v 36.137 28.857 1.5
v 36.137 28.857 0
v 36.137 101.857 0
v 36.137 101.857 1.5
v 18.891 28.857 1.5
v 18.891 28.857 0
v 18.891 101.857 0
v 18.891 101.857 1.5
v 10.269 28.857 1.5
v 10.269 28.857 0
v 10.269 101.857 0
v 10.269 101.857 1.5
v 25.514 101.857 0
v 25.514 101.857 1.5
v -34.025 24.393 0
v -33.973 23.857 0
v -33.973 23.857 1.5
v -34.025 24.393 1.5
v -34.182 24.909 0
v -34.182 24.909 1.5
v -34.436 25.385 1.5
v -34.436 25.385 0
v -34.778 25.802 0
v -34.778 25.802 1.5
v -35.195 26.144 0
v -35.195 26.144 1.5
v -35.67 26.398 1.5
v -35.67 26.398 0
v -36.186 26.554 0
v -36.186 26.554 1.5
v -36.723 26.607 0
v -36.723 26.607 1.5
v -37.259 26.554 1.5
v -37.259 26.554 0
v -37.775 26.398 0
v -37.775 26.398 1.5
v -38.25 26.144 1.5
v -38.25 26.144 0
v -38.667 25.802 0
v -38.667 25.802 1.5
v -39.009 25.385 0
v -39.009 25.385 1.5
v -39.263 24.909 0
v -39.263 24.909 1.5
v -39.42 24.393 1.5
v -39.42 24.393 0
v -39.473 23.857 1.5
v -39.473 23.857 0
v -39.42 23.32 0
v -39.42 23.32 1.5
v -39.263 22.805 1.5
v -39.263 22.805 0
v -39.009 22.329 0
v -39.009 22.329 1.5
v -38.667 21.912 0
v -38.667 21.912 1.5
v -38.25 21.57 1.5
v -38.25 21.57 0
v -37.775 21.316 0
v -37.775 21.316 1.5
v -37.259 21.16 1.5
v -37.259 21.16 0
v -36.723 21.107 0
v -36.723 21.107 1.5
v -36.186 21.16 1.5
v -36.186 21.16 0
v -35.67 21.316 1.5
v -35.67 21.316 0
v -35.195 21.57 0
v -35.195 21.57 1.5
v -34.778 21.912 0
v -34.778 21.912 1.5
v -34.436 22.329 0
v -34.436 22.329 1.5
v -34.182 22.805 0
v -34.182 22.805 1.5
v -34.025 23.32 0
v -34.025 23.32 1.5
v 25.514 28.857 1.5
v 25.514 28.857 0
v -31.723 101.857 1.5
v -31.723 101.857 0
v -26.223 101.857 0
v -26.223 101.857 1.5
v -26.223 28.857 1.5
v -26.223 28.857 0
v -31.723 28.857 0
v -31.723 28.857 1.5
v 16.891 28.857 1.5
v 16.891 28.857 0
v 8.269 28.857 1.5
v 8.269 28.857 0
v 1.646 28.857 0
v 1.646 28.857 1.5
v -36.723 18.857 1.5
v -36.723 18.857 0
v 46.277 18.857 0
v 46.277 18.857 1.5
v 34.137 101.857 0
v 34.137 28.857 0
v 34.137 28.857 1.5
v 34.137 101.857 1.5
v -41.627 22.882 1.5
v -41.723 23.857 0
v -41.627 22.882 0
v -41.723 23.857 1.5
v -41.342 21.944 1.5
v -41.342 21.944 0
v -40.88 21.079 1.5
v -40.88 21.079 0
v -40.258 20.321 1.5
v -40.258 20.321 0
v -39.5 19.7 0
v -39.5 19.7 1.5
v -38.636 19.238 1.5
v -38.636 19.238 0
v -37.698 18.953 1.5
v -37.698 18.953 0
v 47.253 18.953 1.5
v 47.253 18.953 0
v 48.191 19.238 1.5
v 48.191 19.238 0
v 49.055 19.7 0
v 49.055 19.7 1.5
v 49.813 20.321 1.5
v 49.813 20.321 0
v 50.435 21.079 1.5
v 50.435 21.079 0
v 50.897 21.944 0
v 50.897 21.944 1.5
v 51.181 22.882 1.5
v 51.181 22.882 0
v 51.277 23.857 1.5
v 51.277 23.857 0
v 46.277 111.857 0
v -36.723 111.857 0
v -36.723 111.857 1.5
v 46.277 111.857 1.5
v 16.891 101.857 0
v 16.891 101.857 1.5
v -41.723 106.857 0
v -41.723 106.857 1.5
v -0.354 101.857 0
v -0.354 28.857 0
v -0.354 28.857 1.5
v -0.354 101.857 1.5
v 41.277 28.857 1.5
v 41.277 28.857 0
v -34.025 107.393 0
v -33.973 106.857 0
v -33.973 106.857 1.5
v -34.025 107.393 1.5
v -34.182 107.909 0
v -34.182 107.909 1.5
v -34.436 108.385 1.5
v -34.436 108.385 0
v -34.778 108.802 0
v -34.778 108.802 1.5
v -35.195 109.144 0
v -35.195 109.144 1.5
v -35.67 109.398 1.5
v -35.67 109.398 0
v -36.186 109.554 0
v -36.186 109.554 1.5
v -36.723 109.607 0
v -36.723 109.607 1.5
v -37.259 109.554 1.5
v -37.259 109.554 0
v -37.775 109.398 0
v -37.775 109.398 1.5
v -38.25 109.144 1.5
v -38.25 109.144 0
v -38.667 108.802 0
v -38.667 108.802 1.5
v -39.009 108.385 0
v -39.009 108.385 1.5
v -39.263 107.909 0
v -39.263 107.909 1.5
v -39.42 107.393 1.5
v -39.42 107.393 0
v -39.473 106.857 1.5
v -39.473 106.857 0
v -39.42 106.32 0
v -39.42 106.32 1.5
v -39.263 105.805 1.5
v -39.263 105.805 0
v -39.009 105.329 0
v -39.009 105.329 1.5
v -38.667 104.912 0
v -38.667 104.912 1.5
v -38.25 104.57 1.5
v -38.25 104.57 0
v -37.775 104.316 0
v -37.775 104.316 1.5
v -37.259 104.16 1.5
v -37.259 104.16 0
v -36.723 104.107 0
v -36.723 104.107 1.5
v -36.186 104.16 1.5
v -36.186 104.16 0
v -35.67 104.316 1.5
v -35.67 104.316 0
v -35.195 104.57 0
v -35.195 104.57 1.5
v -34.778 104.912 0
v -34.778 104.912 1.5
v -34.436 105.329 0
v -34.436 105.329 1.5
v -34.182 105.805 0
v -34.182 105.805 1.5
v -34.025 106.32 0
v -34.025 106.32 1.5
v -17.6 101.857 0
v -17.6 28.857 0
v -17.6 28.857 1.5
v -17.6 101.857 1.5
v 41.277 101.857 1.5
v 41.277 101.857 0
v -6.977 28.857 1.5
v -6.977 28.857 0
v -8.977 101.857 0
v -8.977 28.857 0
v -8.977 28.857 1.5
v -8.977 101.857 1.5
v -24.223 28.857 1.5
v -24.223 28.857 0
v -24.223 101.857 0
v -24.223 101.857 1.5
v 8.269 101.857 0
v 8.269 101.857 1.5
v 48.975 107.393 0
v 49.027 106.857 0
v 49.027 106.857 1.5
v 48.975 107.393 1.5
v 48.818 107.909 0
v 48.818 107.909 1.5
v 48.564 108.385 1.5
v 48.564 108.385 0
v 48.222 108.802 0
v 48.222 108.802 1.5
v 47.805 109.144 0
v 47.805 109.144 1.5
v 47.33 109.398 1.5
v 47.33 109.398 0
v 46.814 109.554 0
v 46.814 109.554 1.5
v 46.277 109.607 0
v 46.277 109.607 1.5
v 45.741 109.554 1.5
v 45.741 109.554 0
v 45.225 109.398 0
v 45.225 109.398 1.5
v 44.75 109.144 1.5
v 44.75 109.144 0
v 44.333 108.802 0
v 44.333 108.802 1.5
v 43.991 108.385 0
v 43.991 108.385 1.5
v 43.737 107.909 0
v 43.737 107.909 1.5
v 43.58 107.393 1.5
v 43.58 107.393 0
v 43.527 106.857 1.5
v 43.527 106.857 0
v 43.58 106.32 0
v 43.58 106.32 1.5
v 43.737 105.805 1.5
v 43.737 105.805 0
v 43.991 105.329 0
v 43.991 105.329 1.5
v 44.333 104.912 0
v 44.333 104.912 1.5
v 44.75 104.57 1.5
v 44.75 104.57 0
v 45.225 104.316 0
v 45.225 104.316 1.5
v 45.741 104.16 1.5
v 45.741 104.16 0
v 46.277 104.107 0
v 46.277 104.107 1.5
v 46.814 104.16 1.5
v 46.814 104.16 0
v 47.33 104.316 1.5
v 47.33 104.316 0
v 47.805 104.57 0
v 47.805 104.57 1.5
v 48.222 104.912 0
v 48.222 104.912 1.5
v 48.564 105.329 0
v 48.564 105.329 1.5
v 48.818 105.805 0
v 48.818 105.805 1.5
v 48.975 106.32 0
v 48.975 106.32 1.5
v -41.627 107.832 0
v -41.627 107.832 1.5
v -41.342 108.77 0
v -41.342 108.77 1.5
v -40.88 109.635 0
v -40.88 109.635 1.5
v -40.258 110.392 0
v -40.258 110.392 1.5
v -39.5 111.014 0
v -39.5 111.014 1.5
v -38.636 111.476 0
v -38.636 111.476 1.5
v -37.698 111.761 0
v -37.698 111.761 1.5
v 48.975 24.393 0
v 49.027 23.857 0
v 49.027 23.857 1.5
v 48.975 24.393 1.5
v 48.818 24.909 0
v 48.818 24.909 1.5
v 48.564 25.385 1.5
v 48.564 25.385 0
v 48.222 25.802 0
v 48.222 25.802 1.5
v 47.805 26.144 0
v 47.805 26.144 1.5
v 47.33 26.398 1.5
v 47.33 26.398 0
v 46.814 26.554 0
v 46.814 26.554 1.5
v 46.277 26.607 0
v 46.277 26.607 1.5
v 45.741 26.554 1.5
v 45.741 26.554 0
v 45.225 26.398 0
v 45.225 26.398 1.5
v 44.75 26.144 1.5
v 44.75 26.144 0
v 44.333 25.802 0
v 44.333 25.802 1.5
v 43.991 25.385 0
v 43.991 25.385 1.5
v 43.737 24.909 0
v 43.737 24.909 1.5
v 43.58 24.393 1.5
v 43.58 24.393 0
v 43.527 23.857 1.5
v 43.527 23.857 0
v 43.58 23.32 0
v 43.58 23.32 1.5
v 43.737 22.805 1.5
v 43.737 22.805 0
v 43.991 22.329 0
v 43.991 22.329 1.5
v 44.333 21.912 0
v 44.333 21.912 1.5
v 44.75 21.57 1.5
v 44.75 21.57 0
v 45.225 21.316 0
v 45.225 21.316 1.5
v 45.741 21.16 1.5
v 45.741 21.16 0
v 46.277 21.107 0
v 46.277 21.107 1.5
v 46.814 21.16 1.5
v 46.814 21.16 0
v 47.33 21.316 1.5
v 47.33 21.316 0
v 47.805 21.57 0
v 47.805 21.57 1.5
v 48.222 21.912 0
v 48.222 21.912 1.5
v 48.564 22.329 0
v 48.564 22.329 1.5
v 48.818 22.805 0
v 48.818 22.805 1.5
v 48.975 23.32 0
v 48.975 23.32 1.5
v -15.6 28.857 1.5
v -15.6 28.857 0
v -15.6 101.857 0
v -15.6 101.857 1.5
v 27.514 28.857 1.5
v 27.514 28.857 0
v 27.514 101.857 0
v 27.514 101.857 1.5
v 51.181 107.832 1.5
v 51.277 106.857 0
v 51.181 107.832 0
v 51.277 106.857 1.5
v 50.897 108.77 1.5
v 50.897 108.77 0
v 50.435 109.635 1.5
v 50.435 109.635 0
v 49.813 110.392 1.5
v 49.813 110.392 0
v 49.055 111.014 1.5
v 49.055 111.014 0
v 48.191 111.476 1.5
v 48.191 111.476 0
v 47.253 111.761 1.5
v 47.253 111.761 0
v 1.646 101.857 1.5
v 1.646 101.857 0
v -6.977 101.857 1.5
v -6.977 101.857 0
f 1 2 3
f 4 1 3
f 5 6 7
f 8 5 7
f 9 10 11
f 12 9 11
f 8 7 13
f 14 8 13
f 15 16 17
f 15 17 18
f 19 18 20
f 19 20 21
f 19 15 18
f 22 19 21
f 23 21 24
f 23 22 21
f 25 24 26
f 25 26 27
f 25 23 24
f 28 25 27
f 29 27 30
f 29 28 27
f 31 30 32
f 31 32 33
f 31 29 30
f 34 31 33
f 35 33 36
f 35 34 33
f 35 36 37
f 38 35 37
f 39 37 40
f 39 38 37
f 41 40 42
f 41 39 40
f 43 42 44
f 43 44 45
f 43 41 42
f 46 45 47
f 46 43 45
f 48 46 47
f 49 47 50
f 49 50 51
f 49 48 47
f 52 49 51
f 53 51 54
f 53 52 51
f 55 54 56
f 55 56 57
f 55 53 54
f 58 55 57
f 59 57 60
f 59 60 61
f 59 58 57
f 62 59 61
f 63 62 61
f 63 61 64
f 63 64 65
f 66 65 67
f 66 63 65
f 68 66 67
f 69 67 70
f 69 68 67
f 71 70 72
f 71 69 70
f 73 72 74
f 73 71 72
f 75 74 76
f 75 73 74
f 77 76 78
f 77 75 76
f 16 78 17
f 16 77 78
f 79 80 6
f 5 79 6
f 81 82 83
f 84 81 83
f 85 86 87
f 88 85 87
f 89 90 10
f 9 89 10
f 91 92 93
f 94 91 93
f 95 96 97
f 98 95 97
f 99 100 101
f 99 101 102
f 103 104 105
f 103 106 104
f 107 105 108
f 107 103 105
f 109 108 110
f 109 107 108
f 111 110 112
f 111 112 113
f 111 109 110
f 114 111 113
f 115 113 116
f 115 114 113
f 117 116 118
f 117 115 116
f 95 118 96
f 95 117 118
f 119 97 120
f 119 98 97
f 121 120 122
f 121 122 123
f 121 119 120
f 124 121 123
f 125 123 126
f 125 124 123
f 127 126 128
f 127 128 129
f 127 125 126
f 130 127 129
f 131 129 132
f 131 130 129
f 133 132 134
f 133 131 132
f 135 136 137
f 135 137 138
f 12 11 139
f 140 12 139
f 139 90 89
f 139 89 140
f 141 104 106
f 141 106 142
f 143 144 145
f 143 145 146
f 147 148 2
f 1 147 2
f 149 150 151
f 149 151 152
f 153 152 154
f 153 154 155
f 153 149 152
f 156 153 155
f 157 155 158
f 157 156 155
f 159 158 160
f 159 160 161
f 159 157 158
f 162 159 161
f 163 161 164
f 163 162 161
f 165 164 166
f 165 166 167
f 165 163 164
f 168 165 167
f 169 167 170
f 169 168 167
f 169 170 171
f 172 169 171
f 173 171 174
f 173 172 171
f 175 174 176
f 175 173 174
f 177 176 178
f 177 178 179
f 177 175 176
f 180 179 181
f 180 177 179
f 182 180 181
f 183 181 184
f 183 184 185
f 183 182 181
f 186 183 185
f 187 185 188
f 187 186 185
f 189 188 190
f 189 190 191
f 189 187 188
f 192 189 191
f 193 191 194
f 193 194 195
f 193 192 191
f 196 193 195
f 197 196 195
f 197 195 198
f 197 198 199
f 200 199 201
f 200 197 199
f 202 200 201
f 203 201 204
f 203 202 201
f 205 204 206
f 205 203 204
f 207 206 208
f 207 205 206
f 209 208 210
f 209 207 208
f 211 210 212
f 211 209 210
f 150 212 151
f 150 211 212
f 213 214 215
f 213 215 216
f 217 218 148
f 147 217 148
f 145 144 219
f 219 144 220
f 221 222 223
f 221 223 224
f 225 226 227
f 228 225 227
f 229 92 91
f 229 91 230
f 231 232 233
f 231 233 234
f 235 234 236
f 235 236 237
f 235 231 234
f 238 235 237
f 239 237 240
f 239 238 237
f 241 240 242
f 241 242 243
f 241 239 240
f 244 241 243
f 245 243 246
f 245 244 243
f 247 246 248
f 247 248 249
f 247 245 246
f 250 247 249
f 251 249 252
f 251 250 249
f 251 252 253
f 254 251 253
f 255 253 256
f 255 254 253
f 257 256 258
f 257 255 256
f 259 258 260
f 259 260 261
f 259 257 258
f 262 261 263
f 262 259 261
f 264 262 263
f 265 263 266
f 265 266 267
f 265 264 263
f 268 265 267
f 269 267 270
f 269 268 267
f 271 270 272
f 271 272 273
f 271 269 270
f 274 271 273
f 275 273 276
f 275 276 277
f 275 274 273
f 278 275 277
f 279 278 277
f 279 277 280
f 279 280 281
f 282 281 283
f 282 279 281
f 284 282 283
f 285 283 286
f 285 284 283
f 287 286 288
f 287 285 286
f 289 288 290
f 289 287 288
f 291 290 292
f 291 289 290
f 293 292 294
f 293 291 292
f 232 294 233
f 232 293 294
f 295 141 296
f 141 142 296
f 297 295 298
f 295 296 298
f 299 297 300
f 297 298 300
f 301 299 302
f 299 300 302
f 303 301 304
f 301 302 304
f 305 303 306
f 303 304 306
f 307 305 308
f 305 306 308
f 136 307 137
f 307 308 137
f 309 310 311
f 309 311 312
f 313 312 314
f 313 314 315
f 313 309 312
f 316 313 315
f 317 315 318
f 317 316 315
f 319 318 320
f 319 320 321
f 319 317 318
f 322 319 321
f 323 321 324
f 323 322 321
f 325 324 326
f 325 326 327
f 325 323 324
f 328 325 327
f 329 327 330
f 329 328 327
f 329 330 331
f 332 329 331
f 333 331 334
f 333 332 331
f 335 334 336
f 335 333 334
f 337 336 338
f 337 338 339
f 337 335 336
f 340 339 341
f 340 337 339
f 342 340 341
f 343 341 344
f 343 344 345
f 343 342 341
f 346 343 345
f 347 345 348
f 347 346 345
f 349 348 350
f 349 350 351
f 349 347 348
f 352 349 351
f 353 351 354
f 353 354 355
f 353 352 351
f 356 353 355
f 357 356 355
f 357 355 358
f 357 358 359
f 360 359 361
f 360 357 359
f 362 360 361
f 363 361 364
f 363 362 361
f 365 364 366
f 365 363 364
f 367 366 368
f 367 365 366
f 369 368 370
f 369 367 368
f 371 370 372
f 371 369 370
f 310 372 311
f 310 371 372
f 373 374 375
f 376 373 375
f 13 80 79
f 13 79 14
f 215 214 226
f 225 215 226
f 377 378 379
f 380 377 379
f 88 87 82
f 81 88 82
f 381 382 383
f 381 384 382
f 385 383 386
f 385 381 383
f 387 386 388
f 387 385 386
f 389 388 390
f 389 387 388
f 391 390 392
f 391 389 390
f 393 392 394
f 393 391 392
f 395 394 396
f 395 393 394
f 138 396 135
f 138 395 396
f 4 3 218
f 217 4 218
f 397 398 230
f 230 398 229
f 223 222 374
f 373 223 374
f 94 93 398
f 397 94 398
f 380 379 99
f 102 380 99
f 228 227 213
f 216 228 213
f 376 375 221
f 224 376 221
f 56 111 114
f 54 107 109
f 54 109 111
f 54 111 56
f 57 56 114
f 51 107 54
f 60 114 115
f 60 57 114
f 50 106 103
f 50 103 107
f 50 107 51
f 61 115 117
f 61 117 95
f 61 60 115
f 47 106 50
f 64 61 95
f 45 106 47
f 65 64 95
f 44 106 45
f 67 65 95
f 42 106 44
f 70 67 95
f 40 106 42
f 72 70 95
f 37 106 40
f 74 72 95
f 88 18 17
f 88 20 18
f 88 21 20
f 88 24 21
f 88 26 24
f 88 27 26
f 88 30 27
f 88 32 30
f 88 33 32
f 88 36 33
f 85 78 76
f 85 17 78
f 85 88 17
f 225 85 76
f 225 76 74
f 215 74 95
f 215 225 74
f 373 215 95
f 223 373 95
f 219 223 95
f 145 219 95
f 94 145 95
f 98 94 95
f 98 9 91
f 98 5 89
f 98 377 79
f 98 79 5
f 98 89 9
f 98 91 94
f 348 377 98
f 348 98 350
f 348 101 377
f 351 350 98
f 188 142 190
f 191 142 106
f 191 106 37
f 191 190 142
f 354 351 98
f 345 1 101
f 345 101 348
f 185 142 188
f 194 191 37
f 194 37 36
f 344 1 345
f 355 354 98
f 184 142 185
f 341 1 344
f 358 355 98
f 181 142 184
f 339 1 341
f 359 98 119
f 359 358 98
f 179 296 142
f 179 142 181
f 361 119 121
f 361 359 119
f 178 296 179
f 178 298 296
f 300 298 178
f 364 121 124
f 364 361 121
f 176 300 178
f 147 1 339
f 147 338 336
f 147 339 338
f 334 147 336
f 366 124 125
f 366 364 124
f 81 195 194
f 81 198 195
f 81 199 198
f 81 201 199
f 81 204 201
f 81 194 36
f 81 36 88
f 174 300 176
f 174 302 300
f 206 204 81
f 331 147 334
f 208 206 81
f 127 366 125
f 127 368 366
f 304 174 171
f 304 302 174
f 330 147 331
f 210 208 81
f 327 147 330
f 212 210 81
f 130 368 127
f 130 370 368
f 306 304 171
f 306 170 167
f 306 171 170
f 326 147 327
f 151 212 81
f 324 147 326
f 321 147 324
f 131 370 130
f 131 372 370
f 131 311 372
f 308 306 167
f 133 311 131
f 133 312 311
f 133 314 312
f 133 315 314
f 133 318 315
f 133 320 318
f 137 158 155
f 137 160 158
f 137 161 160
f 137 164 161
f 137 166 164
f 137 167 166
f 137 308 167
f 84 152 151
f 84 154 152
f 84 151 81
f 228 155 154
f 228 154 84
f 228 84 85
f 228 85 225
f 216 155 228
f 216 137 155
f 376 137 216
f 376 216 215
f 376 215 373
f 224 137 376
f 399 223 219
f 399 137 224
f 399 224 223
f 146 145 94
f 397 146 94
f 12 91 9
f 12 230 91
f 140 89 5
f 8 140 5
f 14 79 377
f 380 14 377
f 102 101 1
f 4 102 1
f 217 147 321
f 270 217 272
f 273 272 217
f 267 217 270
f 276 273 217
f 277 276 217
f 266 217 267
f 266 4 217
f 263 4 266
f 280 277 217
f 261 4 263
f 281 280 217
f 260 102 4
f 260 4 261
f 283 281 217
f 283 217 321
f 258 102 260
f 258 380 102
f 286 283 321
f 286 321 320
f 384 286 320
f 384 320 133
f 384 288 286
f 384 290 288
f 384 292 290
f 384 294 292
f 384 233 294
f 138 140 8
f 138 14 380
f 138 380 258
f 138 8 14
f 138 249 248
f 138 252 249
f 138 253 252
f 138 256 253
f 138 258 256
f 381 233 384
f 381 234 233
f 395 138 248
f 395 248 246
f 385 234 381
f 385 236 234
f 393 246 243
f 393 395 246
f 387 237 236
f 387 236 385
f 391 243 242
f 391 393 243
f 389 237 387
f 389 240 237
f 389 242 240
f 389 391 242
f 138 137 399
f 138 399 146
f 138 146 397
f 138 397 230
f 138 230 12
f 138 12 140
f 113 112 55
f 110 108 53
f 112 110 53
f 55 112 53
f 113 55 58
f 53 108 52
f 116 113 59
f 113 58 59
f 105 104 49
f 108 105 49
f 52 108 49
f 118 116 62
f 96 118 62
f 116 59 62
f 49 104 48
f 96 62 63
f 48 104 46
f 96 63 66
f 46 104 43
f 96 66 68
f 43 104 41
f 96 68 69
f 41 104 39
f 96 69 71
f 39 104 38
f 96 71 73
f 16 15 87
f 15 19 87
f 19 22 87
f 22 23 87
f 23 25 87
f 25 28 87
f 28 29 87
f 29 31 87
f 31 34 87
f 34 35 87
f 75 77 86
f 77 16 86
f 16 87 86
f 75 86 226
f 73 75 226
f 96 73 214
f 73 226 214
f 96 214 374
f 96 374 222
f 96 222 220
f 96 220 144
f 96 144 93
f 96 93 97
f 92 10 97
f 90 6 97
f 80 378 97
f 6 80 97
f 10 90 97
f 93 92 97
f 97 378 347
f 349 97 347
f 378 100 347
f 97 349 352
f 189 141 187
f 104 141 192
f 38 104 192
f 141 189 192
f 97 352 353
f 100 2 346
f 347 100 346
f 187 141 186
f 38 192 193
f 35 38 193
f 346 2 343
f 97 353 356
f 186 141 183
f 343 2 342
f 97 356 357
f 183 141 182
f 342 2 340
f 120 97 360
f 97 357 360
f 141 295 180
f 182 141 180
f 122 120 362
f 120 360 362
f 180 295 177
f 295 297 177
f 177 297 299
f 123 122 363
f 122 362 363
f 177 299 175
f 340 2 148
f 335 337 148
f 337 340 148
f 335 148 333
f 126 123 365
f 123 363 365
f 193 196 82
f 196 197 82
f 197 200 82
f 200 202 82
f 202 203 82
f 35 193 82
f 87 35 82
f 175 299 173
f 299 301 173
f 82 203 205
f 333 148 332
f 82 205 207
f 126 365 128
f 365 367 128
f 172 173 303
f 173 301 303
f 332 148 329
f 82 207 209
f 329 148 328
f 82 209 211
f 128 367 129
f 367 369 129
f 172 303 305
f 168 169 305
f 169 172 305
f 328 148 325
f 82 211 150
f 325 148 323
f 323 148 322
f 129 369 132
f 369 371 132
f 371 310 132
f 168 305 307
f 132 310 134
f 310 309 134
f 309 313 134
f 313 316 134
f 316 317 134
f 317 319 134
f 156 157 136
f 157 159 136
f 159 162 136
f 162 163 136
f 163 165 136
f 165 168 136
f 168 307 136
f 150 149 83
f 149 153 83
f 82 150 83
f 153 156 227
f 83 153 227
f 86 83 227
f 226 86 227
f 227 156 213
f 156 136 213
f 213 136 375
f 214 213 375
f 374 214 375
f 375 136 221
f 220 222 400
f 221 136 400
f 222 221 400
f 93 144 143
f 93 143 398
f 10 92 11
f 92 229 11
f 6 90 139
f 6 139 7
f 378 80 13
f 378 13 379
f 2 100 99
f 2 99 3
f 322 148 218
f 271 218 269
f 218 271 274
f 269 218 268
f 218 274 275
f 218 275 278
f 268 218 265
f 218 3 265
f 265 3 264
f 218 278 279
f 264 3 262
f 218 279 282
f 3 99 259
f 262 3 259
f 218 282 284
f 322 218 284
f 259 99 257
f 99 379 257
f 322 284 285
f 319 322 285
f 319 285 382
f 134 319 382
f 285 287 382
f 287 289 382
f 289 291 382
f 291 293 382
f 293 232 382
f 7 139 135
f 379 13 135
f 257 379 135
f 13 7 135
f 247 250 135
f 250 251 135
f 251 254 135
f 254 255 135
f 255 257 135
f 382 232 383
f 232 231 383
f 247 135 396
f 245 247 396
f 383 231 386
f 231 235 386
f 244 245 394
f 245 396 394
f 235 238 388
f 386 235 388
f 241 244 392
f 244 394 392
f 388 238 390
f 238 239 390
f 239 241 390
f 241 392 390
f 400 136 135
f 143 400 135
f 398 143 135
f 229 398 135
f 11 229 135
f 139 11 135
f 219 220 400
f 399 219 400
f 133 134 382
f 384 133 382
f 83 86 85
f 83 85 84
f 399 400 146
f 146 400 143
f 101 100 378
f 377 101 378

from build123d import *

# Parameters (mm, degrees)
F0_W     = 93
F0_H     = 93
F0_R     = 2.75
F0_W_2   = 2
F0_H_2   = 73
F1_DEPTH = 1.5
F2_R     = 5


with BuildPart() as f1:
    # F0 (on Top) → F1 (new body)
    with BuildSketch(Plane.XY):
        with Locations((4.777365, 65.356966)):
            Rectangle(F0_W, F0_H)
        with Locations((-36.722635, 23.856966)):
            Circle(F0_R, mode=Mode.SUBTRACT)
        with Locations((46.277365, 23.856966)):
            Circle(F0_R, mode=Mode.SUBTRACT)
        Polygon((-31.722635, 28.856966), (-31.722635, 101.856966), (-26.222635, 101.856966), (-24.222635, 101.856966), (-17.599812, 101.856966), (-15.599812, 101.856966), (-8.976989, 101.856966), (-6.976989, 101.856966), (-0.354166, 101.856966), (1.645834, 101.856966), (8.268656, 101.856966), (10.268656, 101.856966), (16.891479, 101.856966), (18.891479, 101.856966), (25.514302, 101.856966), (27.514302, 101.856966), (34.137125, 101.856966), (36.137125, 101.856966), (41.277365, 101.856966), (41.277365, 28.856966), (36.137125, 28.856966), (34.137125, 28.856966), (27.514302, 28.856966), (25.514302, 28.856966), (18.891479, 28.856966), (16.891479, 28.856966), (10.268656, 28.856966), (8.268656, 28.856966), (1.645834, 28.856966), (-0.354166, 28.856966), (-6.976989, 28.856966), (-8.976989, 28.856966), (-15.599812, 28.856966), (-17.599812, 28.856966), (-24.222635, 28.856966), (-26.222635, 28.856966), align=None, mode=Mode.SUBTRACT)
        with Locations((-36.722635, 106.856966)):
            Circle(F0_R, mode=Mode.SUBTRACT)
        with Locations((46.277365, 106.856966)):
            Circle(F0_R, mode=Mode.SUBTRACT)
        with Locations((-25.222635, 65.356966)):
            Rectangle(F0_W_2, F0_H_2)
        with Locations((-16.599812, 65.356966)):
            Rectangle(F0_W_2, F0_H_2)
        with Locations((-7.976989, 65.356966)):
            Rectangle(F0_W_2, F0_H_2)
        with Locations((0.645834, 65.356966)):
            Rectangle(F0_W_2, F0_H_2)
        with Locations((9.268656, 65.356966)):
            Rectangle(F0_W_2, F0_H_2)
        with Locations((17.891479, 65.356966)):
            Rectangle(F0_W_2, F0_H_2)
        with Locations((26.514302, 65.356966)):
            Rectangle(F0_W_2, F0_H_2)
        with Locations((35.137125, 65.356966)):
            Rectangle(F0_W_2, F0_H_2)
    extrude(amount=F1_DEPTH)

    # F2
    f2_edges = [f1.edges().sort_by_distance(p)[0] for p in [
        (-41.722635, 111.856966, 0.75),
        (51.277365, 111.856966, 0.75),
        (51.277365, 18.856966, 0.75),
        (-41.722635, 18.856966, 0.75),
    ]]
    fillet(f2_edges, radius=F2_R)


solid = f1.part
